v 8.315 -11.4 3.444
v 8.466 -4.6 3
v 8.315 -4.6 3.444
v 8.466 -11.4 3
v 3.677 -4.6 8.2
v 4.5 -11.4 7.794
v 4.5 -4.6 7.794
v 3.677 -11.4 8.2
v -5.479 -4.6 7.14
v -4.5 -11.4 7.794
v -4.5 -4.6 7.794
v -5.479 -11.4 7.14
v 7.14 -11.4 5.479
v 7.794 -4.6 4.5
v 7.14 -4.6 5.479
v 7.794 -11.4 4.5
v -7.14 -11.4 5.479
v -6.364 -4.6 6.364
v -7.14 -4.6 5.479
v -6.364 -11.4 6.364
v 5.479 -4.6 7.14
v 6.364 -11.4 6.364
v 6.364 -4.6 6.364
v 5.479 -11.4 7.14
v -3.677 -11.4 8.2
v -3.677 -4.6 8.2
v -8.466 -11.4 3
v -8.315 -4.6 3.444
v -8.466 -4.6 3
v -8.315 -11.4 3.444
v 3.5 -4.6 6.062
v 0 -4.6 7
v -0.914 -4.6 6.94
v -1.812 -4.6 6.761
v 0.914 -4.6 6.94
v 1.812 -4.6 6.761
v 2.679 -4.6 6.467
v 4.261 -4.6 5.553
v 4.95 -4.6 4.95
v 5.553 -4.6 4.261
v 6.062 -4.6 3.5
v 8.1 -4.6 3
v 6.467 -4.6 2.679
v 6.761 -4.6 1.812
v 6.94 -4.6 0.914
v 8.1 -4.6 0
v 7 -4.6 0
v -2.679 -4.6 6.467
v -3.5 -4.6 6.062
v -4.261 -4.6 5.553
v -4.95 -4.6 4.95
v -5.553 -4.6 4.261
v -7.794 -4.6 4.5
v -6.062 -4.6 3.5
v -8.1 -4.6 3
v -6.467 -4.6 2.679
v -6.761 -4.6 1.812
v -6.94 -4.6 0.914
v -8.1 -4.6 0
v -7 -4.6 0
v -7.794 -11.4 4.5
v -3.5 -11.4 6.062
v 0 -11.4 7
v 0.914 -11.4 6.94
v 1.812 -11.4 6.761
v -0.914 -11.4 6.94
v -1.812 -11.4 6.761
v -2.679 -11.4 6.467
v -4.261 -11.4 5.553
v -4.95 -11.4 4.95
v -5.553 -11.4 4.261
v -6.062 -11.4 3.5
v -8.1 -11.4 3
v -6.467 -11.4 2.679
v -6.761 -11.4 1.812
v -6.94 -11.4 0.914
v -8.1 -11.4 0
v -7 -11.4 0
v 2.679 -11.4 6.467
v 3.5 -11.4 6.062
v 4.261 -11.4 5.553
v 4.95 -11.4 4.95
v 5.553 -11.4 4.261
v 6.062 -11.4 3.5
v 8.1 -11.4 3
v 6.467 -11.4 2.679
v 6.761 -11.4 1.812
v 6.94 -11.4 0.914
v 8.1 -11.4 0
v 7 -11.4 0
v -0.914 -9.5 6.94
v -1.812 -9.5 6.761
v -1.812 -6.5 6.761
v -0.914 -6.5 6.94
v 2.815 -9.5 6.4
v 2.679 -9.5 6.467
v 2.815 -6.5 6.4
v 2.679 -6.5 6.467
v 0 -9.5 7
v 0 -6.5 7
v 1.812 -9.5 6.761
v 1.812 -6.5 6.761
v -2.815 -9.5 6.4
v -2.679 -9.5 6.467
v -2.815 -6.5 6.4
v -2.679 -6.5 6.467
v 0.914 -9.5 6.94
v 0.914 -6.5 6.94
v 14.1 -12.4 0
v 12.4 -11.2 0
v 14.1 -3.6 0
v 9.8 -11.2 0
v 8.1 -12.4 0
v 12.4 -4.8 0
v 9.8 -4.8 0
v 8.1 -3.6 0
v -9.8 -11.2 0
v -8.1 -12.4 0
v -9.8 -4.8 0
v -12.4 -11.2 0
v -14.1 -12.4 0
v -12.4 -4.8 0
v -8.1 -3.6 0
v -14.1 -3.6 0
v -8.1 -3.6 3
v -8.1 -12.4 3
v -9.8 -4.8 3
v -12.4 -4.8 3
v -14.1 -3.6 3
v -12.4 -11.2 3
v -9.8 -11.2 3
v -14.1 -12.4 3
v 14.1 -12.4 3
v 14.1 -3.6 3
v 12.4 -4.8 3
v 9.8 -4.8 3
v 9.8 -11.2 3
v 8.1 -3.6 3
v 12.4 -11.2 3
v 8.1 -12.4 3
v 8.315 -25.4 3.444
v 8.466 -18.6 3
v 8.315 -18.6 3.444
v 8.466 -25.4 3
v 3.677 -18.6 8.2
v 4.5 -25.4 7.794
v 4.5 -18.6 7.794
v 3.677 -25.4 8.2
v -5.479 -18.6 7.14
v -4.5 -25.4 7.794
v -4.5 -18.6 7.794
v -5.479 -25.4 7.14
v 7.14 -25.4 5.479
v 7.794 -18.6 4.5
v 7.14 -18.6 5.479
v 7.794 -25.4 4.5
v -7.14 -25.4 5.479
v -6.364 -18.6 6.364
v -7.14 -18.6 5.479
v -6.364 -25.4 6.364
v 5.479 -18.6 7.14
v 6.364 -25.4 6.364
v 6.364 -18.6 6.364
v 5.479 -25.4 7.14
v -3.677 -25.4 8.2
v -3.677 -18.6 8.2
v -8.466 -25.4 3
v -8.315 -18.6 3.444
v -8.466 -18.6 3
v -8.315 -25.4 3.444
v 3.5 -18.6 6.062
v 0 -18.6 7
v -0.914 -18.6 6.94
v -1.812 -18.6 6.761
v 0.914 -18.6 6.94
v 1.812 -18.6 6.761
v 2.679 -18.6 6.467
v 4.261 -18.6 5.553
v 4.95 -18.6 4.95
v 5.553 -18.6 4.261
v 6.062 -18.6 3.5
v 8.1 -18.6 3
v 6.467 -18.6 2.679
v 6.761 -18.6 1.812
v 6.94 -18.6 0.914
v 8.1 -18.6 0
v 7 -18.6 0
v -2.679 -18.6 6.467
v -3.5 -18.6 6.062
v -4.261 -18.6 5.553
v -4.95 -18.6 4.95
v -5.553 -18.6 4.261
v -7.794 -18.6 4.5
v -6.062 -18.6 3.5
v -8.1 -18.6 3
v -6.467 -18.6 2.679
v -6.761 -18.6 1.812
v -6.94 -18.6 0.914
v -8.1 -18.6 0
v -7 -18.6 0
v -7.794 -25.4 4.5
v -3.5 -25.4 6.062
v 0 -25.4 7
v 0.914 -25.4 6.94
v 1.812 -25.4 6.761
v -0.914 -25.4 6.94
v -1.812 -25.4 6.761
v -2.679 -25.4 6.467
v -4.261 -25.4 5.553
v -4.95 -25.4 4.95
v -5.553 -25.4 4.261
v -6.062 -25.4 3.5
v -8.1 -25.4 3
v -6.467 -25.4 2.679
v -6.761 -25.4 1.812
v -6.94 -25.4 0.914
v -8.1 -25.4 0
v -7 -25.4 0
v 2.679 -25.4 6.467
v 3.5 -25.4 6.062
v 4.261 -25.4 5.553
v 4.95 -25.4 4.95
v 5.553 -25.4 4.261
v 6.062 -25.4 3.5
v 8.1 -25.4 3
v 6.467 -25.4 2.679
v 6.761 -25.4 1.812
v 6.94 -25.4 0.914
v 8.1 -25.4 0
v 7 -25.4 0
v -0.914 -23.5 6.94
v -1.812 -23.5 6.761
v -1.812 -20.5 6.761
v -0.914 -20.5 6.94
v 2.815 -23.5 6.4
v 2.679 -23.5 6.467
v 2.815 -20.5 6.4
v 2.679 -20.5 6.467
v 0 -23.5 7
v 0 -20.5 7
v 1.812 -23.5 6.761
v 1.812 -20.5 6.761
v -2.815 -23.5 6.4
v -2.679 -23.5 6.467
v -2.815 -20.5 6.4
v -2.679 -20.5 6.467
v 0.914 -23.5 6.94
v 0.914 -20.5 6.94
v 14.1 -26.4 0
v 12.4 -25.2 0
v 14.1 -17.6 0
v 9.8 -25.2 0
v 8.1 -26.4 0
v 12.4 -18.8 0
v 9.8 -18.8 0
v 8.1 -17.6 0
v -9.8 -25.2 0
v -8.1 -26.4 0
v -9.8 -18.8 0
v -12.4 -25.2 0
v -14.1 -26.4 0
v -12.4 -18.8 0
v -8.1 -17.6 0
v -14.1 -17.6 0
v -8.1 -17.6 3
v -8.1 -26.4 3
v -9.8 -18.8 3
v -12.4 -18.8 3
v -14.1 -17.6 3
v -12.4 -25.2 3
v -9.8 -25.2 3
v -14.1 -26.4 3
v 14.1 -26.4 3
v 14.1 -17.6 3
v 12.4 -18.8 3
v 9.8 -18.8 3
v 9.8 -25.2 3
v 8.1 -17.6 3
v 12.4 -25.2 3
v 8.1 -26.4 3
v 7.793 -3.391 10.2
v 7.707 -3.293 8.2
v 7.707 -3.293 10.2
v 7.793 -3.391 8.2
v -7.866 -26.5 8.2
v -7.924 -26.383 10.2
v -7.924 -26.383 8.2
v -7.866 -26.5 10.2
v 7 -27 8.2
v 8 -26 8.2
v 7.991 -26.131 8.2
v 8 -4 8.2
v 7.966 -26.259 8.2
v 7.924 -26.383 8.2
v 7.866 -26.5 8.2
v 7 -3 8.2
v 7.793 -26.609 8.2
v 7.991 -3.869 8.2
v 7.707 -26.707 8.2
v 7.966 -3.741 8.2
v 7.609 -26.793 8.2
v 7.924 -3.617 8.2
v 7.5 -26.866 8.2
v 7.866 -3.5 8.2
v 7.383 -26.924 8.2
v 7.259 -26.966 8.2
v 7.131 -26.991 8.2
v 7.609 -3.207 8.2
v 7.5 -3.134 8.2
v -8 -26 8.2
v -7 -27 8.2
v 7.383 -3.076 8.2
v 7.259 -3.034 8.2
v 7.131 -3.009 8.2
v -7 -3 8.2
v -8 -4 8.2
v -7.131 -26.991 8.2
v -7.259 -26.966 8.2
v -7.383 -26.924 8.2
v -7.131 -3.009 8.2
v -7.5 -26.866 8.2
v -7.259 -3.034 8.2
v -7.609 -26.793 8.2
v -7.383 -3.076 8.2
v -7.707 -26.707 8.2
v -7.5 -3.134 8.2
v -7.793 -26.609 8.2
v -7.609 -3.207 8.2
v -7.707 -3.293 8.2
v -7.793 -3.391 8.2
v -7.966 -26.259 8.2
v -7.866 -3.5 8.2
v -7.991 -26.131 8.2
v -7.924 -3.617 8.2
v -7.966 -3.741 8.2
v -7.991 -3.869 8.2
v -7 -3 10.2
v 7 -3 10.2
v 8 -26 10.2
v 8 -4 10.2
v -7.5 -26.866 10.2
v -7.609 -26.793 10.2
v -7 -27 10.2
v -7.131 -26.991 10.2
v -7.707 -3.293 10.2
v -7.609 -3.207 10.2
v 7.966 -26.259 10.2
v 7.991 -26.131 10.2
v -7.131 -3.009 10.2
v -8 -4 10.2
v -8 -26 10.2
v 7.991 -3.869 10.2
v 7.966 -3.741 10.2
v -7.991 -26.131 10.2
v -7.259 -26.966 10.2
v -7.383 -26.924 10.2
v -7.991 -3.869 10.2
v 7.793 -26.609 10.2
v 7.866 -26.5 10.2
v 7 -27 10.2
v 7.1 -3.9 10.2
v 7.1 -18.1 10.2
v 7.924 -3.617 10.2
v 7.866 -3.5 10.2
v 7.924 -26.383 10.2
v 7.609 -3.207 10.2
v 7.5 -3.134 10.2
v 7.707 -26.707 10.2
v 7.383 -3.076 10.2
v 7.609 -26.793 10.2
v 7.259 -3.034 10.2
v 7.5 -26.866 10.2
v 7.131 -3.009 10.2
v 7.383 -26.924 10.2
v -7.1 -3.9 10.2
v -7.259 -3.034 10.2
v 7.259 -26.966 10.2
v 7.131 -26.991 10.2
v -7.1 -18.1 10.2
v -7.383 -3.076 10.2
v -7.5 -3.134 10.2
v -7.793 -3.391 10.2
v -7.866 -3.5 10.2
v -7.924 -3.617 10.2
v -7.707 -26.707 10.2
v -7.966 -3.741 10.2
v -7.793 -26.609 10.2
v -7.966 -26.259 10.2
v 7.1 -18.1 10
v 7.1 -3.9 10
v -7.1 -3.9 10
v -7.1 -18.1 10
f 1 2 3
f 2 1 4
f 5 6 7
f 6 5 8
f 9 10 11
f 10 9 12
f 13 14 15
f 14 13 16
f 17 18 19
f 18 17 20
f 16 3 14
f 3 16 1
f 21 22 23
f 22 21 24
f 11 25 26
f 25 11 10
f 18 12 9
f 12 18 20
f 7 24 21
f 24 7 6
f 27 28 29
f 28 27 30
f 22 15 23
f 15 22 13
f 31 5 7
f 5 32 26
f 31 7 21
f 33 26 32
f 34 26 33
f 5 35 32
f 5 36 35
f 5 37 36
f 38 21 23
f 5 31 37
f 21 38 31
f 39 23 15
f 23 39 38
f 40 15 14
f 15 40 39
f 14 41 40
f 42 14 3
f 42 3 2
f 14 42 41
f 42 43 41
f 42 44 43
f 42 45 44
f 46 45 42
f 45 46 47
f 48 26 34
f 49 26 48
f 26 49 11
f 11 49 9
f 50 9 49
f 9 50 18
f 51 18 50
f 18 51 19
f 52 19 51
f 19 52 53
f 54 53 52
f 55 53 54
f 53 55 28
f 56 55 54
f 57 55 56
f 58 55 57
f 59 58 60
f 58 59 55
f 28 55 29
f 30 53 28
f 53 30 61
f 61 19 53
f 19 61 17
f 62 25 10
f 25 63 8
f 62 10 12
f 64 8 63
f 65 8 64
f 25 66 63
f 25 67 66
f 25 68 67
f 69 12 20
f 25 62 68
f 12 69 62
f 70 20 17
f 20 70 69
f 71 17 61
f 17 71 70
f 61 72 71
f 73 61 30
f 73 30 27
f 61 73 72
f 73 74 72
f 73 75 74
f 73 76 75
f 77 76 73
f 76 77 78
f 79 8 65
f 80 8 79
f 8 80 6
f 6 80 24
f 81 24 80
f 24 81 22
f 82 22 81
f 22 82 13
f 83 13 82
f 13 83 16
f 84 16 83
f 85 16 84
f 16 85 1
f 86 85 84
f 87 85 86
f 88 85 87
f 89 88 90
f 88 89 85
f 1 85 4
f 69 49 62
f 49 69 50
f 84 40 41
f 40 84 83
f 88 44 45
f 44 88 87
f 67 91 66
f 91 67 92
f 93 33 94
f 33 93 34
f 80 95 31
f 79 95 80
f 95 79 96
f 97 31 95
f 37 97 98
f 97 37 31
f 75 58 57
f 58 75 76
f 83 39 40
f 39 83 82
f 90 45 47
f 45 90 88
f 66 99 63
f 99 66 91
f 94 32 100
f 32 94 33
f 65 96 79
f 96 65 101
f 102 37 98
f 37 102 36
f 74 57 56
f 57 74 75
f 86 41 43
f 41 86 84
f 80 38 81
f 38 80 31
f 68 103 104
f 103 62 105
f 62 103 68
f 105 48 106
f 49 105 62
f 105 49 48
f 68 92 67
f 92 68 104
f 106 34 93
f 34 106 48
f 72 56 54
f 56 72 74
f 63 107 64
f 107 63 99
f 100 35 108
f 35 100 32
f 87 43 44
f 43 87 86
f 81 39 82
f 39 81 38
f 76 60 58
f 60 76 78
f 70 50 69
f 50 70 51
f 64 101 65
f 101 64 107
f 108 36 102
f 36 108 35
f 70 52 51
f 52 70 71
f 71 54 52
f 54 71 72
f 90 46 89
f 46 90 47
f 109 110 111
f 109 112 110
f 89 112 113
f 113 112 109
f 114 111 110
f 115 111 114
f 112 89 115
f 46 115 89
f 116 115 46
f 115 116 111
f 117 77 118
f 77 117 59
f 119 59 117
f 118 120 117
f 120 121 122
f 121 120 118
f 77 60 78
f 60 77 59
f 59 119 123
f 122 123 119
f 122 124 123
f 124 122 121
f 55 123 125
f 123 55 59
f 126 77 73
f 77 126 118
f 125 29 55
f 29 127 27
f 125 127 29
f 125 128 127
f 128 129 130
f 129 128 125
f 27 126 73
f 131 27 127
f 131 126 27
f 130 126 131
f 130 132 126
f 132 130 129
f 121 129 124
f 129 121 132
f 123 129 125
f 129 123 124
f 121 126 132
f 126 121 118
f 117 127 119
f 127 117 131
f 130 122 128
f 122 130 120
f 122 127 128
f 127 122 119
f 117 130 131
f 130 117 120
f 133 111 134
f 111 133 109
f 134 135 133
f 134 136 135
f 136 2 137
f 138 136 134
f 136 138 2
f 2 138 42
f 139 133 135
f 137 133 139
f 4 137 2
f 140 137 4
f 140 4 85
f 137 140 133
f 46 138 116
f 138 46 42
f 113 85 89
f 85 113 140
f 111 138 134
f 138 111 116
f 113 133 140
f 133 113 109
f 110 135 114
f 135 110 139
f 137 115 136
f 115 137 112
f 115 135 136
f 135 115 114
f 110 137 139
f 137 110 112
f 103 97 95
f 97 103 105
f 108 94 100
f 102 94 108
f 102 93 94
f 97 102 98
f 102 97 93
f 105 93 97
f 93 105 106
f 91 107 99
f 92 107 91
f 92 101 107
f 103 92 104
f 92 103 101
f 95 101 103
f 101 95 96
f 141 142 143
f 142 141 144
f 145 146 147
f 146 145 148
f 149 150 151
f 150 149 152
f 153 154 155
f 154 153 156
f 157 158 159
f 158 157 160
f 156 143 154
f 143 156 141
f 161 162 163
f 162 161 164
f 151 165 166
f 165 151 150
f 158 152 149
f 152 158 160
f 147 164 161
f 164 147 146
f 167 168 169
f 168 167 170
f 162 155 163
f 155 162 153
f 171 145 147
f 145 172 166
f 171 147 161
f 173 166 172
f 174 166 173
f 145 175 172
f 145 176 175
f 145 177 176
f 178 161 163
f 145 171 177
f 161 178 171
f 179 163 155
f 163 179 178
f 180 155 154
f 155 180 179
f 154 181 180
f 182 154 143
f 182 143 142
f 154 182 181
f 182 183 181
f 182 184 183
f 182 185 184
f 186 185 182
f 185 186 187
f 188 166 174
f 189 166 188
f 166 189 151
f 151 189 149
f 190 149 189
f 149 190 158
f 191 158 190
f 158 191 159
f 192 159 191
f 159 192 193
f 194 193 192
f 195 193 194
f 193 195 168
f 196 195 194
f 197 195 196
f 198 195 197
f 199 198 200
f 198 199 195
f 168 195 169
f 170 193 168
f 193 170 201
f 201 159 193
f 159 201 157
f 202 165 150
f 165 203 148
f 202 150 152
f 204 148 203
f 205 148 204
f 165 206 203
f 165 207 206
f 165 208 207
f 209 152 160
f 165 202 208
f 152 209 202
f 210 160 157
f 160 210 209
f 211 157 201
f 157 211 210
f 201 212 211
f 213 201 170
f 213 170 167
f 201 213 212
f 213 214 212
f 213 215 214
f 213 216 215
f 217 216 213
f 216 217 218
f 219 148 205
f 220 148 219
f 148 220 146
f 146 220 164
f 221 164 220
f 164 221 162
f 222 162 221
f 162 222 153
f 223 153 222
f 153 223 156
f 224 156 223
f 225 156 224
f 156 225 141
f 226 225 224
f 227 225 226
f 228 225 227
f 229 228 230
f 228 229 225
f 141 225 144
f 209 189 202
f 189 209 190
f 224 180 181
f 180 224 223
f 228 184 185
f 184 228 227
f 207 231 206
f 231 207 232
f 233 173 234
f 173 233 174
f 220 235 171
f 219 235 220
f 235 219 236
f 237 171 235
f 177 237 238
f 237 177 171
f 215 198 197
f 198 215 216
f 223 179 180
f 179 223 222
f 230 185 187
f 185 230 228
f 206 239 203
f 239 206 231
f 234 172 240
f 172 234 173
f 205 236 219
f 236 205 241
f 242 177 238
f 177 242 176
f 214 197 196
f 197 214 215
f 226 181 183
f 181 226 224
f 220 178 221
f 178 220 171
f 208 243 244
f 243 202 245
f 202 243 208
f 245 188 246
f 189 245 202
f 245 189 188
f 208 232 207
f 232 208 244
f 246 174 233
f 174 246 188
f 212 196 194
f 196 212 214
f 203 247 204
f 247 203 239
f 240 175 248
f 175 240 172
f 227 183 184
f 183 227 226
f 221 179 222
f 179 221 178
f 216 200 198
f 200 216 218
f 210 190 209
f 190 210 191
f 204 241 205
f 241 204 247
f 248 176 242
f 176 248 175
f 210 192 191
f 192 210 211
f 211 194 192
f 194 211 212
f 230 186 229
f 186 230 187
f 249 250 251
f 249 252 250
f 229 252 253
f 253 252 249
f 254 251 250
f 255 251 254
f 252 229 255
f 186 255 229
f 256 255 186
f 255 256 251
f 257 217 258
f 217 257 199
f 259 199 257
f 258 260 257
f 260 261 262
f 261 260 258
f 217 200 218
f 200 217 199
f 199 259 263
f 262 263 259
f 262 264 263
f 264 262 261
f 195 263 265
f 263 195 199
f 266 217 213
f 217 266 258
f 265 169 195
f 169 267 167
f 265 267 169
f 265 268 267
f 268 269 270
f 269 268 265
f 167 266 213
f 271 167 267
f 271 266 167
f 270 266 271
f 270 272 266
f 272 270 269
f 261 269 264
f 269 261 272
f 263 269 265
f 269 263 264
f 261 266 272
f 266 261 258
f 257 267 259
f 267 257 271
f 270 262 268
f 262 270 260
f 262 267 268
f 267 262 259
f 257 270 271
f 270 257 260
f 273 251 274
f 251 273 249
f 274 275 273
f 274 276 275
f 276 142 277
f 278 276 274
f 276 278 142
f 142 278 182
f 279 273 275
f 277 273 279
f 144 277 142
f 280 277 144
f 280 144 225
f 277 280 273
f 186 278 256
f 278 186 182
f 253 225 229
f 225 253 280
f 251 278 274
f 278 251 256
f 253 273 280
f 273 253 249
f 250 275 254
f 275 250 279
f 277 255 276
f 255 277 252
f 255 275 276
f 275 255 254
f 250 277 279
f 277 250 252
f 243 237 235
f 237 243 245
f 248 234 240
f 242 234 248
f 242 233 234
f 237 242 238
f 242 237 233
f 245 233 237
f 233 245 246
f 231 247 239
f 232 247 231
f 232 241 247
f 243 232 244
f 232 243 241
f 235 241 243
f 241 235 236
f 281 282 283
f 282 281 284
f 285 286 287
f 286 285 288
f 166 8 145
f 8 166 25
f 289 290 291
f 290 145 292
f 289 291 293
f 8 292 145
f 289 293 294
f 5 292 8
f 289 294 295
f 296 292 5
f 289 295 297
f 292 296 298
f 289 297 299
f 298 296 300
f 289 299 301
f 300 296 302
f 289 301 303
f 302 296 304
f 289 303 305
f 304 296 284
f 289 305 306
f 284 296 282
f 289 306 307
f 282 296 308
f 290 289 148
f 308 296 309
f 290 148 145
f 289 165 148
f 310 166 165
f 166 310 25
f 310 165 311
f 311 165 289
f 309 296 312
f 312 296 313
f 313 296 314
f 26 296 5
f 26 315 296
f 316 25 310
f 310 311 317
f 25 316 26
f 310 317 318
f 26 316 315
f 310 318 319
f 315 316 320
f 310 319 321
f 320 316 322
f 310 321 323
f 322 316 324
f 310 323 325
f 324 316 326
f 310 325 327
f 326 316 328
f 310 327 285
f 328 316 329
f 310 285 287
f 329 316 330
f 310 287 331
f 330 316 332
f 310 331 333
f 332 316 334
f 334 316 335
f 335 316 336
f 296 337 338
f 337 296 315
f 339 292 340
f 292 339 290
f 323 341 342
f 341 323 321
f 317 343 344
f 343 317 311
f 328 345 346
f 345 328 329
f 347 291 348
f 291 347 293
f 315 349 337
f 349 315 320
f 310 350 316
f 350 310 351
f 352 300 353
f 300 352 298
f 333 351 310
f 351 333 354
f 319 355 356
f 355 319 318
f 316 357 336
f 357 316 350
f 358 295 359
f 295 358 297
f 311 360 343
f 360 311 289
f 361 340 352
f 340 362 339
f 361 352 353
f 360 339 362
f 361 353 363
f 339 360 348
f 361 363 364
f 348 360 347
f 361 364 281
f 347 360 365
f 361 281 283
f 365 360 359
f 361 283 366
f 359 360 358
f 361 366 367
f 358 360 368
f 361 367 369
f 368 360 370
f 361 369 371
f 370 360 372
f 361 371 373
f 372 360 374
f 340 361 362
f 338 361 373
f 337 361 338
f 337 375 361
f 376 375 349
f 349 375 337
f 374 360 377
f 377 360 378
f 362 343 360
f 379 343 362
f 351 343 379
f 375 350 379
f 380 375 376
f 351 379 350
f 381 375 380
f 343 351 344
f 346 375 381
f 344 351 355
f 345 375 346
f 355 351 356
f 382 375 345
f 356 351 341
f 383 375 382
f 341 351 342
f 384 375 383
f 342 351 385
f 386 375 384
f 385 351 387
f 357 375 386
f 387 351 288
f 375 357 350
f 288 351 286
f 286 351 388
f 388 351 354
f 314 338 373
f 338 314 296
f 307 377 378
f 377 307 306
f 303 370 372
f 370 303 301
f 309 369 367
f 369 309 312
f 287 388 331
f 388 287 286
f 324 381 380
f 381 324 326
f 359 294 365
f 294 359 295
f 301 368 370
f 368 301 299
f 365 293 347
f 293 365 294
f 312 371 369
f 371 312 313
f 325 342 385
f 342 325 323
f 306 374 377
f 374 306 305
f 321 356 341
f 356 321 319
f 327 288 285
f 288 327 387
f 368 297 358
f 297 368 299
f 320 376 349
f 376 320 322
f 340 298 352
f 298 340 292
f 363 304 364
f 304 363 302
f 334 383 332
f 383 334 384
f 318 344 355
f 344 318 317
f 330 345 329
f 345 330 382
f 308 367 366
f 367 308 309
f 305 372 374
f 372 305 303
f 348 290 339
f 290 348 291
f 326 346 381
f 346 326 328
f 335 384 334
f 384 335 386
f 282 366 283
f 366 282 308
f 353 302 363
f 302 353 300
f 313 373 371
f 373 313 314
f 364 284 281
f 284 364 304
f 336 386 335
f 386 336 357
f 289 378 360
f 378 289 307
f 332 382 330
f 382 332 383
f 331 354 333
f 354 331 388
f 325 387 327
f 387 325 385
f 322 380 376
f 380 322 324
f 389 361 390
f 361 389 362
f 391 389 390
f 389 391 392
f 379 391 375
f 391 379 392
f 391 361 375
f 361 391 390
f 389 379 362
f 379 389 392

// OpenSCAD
// ReachSense six-finger wrap v2. Units: mm. Experimental, physically unverified.
// R: +X lateral, +Y distal (towards fingertip), +Z dorsal.
// A REMOVABLE seating gauge defines Y=0. The wearable deck ends at Y=-3.
// Remove the gauge before testing; no permanent wall blocks the fingertip.
// This defines nominal longitudinal registration, NOT an anatomical 3D point.
$fn = 48;
part = "holder"; // "holder", "gauge" or "strap"
marker_id = 23;
finger_diameter_mm = 14;
marker_edge_mm = 10;
quiet_zone_mm = 2;
frame_mm = 1;
wall_mm = 2;
stop_wall_mm = 1.2;
strap_width_mm = 6;
strap_length_mm = 90;
gauge_side_clearance_mm = 0.3;
r = finger_diameter_mm/2;
tile = marker_edge_mm + 2*quiet_zone_mm;
deck_width = tile + 2*frame_mm;
length = tile + 2*frame_mm + 8;
deck_front_y = -3;
deck_back_y = deck_front_y-length;
deck_bottom = r + wall_mm - 0.8;
deck_top = deck_bottom + 2;
pocket_depth = 0.2;
marker_y = deck_front_y-(frame_mm+quiet_zone_mm+marker_edge_mm/2);
support_y = [deck_front_y-5,deck_back_y+5];
nail_seat_width = min(8,finger_diameter_mm/2);
nail_seat_z = r-0.6;
assert(finger_diameter_mm >= 12 && finger_diameter_mm <= 26,"Choose a 12–26 mm candidate opening");
assert(marker_edge_mm >= 8 && marker_edge_mm <= 16,"Choose an 8–16 mm black edge");
assert(quiet_zone_mm >= 2,"Keep the full white quiet zone");
assert(marker_id >= 0 && marker_id < 100,"DICT_4X4_100 ID required");
module support(y) {
    translate([0,y,0]) intersection() {
        difference() {
            rotate([90,0,0]) cylinder(r=r+wall_mm,h=6.8,center=true);
            rotate([90,0,0]) cylinder(r=r,h=8.8,center=true);
        }
        translate([-r-wall_mm-1,-4.4,0]) cube([2*(r+wall_mm+1),8.8,r+wall_mm+1]);
    }
    // Flat dorsal bearing at each strap region closes the gap below the deck.
    // Contact with a real nail/dorsal surface and rotational retention are unverified.
    translate([-nail_seat_width/2,y-1.5,nail_seat_z])
        cube([nail_seat_width,3,deck_bottom-nail_seat_z+0.2]);
    for(sign=[-1,1]) translate([sign*(r+wall_mm+2.1),y,1.5]) difference() {
        cube([6,8.8,3],center=true);
        cube([2.6,6.4,5],center=true);
    }
}
module deck() {
    // Rounded corners retain a straight central gauge abutment at Y=-3.
    hull() for(x=[-deck_width/2+1,deck_width/2-1])
        for(y=[deck_back_y+1,deck_front_y-1])
            translate([x,y,deck_bottom]) cylinder(r=1,h=2);
}
module holder() {
    difference() {
        union() { for(y=support_y) support(y); deck(); }
        translate([-tile/2-0.1,marker_y-tile/2-0.1,deck_top-pocket_depth])
            cube([tile+0.2,tile+0.2,pocket_depth+1]);
    }
}
module gauge() {
    // Hand-held drop-on gauge, NOT a validated snap fit. Hold its proximal
    // abutment against the deck's front face at Y=-3 while gently seating the finger.
    // Feet sit on the bare side frame; the ArUco pocket remains clear.
    union() {
        translate([-deck_width/2-2.3,deck_front_y,deck_top])
            cube([deck_width+4.6,-deck_front_y+stop_wall_mm,1.2]);
        // Deck contact Y=-3; fingertip contact Y=0. Remove upwards after tightening.
        translate([-deck_width/2+1,deck_front_y,deck_bottom])
            cube([deck_width-2,-deck_front_y,deck_top-deck_bottom+0.5]);
        translate([-deck_width/2,0,-r/2])
            cube([deck_width,stop_wall_mm,deck_top+1.2+r/2]);
        for(sign=[-1,1]) {
            x=sign>0 ? deck_width/2+gauge_side_clearance_mm : -deck_width/2-gauge_side_clearance_mm-2;
            translate([x,-10,deck_bottom]) cube([2,10,deck_top-deck_bottom+1.2]);
            foot_x=sign>0 ? deck_width/2-0.8 : -deck_width/2-2.3;
            translate([foot_x,-10,deck_top]) cube([3.1,10,1.2]);
        }
    }
}
module strap() {
    // TPU-only ladder strip. Ends require a return loop/fastener or hook-and-loop.
    union() {
        translate([-strap_length_mm/2,-strap_width_mm/2,0]) cube([strap_length_mm,strap_width_mm,0.8]);
        for(x=[-strap_length_mm/2+3:4:strap_length_mm/2-3])
            translate([x-0.7,-strap_width_mm/2,0.8]) cube([1.4,strap_width_mm,0.5]);
    }
}
if(part=="strap") strap(); else if(part=="gauge") gauge(); else holder();
echo(reference_plane_y_mm=0,deck_front_y_mm=deck_front_y);
echo(marker_center_R_mm=[0,marker_y,deck_top-pocket_depth+0.15]);
echo(marker_center_to_reference_plane_mm=-marker_y);
